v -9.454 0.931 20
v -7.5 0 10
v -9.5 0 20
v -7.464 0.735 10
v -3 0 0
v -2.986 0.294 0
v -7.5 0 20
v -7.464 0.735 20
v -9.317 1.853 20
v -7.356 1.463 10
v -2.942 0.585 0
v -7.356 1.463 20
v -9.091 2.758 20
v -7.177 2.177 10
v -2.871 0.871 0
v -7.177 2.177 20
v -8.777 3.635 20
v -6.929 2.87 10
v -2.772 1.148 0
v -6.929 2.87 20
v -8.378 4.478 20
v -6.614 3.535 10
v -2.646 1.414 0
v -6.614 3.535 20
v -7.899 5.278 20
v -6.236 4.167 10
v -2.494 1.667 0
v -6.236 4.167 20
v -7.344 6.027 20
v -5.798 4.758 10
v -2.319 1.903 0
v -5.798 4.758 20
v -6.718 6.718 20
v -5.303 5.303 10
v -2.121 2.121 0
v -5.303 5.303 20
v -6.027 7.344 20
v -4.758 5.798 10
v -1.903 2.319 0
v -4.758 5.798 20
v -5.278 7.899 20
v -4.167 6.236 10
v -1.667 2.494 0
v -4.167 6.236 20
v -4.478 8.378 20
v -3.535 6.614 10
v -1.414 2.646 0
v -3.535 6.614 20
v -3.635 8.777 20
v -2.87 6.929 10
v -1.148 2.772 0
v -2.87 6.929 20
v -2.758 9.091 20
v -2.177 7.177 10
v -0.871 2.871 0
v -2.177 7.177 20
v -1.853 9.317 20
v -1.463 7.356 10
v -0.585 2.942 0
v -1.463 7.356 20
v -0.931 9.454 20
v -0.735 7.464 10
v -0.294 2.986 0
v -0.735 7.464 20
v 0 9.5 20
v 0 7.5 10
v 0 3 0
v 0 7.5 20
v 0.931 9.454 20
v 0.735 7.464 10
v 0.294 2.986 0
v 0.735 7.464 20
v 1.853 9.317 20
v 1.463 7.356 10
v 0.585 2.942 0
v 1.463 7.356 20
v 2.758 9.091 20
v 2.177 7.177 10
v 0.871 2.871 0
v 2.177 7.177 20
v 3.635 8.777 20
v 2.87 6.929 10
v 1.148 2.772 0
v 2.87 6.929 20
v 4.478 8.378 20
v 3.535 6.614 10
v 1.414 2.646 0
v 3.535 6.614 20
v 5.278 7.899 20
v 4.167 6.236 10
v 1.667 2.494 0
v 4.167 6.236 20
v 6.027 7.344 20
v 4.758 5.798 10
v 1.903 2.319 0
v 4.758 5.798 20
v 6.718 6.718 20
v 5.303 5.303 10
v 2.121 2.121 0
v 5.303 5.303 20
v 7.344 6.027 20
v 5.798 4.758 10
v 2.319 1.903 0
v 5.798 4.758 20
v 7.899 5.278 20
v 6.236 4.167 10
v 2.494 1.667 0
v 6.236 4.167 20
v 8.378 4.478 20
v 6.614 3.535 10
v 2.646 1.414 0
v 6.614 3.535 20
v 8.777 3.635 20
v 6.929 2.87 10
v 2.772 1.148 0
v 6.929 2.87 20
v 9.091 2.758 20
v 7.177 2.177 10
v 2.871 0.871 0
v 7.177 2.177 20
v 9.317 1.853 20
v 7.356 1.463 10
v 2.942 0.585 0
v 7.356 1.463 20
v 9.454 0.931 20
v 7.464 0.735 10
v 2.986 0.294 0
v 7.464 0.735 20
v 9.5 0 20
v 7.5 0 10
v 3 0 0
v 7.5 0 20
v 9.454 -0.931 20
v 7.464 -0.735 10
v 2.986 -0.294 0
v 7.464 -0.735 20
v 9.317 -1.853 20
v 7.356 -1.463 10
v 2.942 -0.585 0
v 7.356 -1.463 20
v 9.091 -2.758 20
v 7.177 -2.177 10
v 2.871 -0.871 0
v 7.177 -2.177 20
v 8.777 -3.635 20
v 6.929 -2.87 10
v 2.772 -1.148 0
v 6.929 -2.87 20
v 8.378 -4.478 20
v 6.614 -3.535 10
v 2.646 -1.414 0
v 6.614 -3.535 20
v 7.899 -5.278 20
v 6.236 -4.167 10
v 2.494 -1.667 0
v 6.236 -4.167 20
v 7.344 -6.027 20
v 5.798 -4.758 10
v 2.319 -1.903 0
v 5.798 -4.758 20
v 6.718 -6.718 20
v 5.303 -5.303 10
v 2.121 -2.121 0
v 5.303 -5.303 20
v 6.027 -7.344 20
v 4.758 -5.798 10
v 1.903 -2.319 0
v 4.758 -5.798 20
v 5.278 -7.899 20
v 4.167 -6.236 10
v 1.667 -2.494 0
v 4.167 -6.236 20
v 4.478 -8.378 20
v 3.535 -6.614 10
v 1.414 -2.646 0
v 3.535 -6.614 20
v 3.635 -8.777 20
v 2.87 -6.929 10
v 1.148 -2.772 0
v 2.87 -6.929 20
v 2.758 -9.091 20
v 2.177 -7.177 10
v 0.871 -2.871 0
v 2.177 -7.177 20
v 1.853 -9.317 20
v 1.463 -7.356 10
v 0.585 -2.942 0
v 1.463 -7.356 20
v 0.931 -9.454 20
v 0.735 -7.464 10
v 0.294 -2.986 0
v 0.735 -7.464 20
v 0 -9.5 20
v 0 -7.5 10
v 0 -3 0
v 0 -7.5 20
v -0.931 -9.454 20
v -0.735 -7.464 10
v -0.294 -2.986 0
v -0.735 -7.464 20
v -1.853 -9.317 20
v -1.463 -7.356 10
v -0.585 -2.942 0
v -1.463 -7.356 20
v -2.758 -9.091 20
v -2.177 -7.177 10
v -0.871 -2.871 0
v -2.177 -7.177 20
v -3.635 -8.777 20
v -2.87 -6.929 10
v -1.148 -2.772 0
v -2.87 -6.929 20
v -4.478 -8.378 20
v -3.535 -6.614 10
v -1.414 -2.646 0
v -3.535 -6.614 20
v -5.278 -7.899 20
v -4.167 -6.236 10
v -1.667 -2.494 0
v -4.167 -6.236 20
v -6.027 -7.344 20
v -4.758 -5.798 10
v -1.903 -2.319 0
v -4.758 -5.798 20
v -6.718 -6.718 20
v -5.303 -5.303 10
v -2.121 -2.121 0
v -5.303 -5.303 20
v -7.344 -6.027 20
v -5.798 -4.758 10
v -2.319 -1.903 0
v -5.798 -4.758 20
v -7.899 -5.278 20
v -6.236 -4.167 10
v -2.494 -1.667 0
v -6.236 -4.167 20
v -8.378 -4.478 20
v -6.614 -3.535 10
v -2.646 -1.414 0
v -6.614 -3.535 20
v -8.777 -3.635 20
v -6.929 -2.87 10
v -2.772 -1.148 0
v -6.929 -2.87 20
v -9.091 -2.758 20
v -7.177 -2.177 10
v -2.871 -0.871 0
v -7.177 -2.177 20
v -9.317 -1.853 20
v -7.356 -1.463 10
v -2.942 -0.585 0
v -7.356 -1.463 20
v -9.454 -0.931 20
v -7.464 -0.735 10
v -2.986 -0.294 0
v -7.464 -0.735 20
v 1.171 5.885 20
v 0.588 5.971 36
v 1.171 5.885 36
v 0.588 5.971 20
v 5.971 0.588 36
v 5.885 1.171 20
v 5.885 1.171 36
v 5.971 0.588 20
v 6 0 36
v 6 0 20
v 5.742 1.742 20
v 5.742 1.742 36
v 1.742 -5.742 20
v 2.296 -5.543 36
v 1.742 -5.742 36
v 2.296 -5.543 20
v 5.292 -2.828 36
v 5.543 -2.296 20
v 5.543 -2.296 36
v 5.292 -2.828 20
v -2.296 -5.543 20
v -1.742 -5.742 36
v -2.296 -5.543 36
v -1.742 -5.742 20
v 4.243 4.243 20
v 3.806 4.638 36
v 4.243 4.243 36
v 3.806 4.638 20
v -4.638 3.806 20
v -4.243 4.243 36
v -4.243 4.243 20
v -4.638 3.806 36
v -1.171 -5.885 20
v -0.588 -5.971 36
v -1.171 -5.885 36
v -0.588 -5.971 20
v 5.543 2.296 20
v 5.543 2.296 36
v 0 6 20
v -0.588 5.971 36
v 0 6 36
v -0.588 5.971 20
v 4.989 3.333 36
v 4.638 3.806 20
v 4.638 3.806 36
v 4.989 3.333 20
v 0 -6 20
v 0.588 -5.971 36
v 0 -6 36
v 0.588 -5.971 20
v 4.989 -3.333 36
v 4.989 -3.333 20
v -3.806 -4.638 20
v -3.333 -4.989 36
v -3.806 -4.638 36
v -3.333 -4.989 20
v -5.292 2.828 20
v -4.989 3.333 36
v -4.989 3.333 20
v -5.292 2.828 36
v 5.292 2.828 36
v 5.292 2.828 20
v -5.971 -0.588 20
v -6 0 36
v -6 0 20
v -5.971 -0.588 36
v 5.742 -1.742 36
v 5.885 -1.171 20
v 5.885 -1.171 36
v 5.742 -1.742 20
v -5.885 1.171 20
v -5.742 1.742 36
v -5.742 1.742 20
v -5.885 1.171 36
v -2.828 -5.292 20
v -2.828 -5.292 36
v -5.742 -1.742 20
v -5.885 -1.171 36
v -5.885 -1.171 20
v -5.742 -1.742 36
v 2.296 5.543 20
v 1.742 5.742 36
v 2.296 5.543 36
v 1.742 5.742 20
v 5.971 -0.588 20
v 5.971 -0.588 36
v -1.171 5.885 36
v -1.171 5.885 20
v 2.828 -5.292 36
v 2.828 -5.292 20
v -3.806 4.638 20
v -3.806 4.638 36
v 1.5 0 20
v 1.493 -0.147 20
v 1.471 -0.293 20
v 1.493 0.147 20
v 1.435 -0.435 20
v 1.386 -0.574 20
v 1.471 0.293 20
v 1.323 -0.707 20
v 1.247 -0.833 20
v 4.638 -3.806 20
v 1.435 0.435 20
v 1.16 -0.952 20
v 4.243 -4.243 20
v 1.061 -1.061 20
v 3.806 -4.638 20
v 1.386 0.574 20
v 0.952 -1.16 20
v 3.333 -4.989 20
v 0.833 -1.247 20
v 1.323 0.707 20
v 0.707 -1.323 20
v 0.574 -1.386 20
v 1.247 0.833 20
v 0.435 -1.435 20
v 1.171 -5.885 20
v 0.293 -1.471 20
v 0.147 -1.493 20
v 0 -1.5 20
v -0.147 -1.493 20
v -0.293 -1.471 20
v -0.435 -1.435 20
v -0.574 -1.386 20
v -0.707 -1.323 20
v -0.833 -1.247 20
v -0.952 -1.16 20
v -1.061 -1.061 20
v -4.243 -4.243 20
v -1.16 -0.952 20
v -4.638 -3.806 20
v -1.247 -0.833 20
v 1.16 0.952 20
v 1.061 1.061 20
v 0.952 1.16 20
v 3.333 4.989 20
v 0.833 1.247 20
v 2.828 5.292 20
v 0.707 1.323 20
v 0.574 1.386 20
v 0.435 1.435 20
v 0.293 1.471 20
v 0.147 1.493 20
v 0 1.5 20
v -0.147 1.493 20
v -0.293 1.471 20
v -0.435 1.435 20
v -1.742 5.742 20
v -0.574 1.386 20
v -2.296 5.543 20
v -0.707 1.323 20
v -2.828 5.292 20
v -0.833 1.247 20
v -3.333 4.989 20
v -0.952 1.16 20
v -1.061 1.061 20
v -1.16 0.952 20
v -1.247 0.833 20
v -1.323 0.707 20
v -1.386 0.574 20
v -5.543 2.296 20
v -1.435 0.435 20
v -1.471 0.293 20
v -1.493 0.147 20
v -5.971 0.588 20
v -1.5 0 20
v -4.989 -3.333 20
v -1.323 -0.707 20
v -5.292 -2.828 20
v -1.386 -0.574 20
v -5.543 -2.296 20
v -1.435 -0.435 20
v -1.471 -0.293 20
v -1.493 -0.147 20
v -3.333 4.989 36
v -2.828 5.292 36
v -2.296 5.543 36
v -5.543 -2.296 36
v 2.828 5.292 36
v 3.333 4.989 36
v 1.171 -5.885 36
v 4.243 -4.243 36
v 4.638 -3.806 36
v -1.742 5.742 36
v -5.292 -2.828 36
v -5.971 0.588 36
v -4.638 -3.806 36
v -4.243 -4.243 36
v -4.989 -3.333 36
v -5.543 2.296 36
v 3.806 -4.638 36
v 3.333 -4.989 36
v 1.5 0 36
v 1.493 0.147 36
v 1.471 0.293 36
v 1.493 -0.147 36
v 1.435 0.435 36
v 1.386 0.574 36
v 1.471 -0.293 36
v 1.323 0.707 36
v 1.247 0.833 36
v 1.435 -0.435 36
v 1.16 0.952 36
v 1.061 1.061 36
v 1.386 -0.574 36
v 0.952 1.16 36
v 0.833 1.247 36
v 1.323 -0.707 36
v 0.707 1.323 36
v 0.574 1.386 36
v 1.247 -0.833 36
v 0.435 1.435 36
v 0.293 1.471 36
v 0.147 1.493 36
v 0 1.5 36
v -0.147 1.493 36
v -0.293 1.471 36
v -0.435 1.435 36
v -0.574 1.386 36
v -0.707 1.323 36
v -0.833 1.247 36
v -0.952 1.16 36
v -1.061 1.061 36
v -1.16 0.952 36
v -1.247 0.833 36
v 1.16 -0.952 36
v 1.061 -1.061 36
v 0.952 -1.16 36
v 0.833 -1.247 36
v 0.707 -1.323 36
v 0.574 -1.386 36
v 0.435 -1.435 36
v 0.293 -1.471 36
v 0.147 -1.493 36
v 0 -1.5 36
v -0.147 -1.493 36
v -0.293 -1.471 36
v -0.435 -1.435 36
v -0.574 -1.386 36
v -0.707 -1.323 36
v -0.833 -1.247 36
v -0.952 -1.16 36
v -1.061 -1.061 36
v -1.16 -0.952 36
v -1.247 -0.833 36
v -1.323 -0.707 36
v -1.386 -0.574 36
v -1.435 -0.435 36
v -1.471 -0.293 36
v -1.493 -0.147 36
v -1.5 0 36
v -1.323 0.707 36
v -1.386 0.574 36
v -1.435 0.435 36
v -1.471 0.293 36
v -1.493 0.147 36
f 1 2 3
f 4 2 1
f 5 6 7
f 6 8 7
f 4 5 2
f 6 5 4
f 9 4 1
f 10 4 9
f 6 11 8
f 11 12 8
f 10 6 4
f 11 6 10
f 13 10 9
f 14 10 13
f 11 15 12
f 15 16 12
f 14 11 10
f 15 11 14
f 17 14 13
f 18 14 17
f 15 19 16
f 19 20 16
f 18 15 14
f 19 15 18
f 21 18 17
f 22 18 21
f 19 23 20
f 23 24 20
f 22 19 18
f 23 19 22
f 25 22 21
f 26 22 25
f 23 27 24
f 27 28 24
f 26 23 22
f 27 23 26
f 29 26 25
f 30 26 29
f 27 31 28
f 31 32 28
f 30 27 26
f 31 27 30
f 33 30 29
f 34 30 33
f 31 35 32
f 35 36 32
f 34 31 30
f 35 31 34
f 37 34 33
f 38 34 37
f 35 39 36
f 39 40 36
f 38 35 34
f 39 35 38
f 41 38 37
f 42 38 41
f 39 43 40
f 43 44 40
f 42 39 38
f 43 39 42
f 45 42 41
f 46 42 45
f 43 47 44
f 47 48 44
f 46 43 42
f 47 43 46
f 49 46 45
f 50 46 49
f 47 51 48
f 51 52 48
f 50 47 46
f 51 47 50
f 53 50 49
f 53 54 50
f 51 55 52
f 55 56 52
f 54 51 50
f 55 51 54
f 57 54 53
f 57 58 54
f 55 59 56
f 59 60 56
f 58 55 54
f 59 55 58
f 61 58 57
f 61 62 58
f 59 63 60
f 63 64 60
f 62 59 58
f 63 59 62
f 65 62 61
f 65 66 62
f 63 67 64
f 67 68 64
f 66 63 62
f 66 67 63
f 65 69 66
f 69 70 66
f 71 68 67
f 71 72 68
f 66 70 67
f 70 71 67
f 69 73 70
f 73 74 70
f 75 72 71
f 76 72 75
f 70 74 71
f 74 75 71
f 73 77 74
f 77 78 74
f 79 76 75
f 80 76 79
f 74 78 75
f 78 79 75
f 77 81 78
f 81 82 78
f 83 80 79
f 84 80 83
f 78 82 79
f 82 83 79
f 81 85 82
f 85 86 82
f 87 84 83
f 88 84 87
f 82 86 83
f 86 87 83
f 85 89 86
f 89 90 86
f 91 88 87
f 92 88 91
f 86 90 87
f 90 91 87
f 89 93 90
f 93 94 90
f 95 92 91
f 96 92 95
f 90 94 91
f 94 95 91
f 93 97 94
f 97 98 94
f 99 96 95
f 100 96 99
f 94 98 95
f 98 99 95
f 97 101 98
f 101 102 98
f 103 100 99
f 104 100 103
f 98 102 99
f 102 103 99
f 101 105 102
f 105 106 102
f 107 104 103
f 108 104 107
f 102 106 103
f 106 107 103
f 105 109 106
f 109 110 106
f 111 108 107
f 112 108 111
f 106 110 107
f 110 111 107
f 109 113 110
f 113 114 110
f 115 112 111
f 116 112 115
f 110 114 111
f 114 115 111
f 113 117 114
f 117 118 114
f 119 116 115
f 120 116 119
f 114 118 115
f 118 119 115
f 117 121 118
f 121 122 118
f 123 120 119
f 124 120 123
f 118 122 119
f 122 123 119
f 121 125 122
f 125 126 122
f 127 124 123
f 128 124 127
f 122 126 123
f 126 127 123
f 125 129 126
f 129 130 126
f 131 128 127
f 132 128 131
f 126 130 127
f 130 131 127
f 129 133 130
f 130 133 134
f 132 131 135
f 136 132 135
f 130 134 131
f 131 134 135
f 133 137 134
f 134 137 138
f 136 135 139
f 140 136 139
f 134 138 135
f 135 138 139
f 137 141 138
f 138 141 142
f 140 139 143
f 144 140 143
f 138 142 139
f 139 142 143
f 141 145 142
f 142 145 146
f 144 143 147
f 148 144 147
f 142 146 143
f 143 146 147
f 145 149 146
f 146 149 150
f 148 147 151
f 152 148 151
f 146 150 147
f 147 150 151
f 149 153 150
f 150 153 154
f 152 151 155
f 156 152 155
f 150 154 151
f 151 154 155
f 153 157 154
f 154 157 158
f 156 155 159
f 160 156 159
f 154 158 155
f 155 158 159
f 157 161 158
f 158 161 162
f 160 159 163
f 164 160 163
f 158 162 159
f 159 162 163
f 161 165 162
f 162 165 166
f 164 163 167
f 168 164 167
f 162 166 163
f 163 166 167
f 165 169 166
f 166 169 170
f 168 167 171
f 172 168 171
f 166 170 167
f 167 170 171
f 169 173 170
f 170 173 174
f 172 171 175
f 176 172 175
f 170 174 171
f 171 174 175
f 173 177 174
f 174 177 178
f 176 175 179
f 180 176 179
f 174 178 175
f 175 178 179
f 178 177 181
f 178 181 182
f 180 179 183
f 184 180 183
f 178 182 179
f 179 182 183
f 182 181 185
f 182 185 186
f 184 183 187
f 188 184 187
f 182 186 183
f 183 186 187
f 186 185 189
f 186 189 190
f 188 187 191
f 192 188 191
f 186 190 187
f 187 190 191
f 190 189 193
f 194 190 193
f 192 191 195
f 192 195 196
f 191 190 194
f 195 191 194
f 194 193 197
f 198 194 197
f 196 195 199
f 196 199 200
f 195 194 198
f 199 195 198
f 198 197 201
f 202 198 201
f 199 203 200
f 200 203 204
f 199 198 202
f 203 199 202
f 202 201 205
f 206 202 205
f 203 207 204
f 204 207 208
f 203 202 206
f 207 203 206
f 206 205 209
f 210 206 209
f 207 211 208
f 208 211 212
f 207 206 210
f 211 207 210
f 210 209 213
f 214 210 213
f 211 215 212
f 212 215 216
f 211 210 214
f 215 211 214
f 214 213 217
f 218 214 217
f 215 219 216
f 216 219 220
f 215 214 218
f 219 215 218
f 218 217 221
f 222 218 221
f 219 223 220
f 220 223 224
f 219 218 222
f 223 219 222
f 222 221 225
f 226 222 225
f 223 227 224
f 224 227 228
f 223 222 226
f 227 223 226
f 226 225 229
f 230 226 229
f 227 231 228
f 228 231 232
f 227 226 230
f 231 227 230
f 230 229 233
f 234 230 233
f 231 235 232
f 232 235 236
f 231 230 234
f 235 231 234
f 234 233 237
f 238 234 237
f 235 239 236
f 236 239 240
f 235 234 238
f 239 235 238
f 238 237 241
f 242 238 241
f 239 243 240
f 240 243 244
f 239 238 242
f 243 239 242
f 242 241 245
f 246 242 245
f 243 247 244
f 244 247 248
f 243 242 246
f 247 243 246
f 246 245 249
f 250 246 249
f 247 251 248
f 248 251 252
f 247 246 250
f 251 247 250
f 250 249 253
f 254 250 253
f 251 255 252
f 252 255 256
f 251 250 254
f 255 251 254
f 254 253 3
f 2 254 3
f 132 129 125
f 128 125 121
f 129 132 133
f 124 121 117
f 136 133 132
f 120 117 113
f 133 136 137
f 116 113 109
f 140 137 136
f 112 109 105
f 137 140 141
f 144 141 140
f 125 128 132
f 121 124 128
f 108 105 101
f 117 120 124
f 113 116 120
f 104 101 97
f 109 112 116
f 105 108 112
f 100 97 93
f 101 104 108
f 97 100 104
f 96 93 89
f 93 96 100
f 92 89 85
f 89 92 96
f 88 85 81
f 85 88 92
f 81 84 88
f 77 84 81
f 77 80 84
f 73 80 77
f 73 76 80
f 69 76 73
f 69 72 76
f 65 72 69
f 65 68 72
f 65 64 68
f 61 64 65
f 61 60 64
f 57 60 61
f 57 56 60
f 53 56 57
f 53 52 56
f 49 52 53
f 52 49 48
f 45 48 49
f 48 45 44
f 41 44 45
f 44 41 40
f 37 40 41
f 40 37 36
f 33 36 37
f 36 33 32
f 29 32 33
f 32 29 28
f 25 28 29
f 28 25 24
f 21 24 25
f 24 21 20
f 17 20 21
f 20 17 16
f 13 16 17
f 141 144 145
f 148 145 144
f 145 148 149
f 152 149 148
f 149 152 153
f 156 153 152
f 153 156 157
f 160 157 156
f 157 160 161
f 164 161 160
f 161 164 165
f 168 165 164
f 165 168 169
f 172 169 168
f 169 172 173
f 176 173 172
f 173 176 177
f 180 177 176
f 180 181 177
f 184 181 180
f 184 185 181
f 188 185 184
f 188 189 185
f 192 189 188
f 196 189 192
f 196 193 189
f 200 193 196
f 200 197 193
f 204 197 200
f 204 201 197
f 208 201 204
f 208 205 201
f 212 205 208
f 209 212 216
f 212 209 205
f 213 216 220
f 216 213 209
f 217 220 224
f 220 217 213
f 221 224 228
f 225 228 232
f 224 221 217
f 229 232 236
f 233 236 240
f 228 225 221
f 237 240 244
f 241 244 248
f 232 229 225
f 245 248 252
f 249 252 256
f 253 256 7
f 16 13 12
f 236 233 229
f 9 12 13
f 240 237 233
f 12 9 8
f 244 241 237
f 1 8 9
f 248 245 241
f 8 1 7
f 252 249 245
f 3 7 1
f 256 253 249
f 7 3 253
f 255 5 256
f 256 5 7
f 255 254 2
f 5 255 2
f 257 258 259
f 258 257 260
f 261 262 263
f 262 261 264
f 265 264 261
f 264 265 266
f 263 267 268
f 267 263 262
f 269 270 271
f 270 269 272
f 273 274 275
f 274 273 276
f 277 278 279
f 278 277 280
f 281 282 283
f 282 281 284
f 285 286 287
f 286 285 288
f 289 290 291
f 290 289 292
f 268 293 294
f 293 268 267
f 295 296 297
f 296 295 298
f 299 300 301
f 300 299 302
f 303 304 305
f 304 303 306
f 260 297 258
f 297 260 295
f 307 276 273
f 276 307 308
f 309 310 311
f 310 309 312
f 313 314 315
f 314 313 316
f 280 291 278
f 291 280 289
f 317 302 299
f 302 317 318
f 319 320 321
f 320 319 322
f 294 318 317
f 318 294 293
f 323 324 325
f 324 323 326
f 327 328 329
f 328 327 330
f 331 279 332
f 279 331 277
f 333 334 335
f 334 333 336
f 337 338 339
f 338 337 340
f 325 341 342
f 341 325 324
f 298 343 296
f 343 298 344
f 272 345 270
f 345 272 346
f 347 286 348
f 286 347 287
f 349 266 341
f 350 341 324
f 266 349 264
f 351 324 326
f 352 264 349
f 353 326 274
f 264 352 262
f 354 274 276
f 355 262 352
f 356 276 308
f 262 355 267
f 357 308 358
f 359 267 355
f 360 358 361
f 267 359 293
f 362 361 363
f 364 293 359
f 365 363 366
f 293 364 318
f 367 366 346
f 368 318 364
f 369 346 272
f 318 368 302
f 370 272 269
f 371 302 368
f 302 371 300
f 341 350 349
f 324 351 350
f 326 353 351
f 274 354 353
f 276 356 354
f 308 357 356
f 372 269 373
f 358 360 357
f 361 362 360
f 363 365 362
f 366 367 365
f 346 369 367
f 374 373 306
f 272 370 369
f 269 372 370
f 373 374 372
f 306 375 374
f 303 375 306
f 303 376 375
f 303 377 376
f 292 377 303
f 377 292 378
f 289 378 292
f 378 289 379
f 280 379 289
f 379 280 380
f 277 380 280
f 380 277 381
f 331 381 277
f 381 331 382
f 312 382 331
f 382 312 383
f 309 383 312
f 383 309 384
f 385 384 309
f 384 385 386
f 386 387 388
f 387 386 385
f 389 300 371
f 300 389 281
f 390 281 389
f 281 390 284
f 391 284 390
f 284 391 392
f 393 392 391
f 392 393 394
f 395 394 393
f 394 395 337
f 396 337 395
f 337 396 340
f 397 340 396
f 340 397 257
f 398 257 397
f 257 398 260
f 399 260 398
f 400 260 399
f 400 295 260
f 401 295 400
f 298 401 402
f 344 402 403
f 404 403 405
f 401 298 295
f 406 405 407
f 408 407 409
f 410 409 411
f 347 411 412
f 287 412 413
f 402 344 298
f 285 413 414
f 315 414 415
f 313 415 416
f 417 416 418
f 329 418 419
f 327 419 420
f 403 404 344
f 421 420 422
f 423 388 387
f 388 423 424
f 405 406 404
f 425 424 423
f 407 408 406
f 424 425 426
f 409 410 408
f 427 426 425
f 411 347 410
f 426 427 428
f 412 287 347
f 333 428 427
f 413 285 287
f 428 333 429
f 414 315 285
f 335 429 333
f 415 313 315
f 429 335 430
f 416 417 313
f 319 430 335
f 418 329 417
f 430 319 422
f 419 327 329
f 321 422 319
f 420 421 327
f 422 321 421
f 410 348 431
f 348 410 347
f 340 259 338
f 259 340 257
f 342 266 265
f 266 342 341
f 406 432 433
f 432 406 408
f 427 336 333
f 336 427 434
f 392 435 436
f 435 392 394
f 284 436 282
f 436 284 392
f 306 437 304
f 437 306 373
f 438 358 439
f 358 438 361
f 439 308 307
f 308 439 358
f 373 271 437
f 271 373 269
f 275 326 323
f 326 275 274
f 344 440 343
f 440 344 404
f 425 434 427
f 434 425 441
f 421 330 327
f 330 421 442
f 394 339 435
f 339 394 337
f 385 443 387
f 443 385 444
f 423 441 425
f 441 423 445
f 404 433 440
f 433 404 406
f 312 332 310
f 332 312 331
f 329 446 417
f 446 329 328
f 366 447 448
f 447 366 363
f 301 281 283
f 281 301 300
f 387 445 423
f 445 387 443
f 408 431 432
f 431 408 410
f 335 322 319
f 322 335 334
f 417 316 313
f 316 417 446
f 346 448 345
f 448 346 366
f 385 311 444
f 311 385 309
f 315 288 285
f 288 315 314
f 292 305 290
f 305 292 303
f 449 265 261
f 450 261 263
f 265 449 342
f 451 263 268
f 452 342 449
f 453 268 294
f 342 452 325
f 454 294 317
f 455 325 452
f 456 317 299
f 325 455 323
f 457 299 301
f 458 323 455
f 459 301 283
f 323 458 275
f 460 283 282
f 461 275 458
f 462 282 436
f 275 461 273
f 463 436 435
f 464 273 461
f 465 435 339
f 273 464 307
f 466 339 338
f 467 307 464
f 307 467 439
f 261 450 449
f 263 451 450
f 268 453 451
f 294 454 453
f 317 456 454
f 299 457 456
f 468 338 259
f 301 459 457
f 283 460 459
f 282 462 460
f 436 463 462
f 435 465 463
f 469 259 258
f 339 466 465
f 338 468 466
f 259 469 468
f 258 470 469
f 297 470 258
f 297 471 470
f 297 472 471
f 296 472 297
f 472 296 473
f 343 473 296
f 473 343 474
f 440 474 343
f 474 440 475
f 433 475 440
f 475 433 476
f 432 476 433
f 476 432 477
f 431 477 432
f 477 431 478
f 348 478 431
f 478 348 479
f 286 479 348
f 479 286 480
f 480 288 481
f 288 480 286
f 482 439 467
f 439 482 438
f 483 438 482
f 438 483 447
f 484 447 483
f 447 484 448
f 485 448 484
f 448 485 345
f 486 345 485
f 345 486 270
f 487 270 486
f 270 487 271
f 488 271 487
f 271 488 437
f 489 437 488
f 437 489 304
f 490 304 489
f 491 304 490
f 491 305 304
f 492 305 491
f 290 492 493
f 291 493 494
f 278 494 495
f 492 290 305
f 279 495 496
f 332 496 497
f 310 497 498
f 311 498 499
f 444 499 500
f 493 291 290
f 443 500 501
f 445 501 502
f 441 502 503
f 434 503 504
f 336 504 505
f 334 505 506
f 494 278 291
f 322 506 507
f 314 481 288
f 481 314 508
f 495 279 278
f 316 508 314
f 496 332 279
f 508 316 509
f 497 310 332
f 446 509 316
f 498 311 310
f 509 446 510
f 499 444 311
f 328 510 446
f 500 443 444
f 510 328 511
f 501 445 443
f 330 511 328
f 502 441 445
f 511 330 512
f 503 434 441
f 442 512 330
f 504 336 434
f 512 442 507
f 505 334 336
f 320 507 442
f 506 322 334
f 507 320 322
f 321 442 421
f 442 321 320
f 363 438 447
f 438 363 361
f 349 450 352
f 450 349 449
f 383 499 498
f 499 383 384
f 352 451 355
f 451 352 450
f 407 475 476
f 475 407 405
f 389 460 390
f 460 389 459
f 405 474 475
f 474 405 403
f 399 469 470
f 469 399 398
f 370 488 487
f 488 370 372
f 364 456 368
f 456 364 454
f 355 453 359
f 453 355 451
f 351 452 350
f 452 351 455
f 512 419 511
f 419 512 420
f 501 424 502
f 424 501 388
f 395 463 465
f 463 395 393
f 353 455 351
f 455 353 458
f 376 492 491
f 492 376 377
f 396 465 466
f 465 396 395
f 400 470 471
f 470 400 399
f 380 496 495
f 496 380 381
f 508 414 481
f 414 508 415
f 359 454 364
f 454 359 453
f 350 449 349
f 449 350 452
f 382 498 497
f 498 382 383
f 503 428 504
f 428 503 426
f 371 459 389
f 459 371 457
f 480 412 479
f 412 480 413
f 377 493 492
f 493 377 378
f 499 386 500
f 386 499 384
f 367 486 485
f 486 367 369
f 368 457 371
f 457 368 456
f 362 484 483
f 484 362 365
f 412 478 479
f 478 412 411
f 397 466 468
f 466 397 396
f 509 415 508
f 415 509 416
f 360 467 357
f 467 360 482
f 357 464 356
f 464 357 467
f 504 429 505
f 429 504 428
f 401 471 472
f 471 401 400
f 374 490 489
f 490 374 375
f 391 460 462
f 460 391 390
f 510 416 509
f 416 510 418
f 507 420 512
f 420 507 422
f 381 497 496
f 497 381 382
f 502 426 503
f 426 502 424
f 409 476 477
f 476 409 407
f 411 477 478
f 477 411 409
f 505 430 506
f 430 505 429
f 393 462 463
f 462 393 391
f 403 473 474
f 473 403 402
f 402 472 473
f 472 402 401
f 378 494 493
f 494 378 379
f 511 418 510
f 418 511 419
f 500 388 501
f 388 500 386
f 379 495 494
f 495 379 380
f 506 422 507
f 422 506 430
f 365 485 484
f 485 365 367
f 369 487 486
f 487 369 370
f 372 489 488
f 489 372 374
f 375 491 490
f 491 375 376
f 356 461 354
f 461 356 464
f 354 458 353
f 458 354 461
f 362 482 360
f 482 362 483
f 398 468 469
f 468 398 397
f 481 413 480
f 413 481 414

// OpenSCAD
// Built by bench/smallmodels/features/compiler.py from a list of features.
$fn = 64;
difference() {
  union() {
    translate([0, 0, 0]) rotate_extrude() polygon([[3, 0], [7.5, 20], [9.5, 20], [7.5, 10], [3, 0]]);
    translate([0, 0, 20]) cylinder(d = 12, h = 16);
  }
  union() {
    translate([0, 0, -1]) rotate([0, 0, 0]) cylinder(d = 3, h = 38);
  }
}
